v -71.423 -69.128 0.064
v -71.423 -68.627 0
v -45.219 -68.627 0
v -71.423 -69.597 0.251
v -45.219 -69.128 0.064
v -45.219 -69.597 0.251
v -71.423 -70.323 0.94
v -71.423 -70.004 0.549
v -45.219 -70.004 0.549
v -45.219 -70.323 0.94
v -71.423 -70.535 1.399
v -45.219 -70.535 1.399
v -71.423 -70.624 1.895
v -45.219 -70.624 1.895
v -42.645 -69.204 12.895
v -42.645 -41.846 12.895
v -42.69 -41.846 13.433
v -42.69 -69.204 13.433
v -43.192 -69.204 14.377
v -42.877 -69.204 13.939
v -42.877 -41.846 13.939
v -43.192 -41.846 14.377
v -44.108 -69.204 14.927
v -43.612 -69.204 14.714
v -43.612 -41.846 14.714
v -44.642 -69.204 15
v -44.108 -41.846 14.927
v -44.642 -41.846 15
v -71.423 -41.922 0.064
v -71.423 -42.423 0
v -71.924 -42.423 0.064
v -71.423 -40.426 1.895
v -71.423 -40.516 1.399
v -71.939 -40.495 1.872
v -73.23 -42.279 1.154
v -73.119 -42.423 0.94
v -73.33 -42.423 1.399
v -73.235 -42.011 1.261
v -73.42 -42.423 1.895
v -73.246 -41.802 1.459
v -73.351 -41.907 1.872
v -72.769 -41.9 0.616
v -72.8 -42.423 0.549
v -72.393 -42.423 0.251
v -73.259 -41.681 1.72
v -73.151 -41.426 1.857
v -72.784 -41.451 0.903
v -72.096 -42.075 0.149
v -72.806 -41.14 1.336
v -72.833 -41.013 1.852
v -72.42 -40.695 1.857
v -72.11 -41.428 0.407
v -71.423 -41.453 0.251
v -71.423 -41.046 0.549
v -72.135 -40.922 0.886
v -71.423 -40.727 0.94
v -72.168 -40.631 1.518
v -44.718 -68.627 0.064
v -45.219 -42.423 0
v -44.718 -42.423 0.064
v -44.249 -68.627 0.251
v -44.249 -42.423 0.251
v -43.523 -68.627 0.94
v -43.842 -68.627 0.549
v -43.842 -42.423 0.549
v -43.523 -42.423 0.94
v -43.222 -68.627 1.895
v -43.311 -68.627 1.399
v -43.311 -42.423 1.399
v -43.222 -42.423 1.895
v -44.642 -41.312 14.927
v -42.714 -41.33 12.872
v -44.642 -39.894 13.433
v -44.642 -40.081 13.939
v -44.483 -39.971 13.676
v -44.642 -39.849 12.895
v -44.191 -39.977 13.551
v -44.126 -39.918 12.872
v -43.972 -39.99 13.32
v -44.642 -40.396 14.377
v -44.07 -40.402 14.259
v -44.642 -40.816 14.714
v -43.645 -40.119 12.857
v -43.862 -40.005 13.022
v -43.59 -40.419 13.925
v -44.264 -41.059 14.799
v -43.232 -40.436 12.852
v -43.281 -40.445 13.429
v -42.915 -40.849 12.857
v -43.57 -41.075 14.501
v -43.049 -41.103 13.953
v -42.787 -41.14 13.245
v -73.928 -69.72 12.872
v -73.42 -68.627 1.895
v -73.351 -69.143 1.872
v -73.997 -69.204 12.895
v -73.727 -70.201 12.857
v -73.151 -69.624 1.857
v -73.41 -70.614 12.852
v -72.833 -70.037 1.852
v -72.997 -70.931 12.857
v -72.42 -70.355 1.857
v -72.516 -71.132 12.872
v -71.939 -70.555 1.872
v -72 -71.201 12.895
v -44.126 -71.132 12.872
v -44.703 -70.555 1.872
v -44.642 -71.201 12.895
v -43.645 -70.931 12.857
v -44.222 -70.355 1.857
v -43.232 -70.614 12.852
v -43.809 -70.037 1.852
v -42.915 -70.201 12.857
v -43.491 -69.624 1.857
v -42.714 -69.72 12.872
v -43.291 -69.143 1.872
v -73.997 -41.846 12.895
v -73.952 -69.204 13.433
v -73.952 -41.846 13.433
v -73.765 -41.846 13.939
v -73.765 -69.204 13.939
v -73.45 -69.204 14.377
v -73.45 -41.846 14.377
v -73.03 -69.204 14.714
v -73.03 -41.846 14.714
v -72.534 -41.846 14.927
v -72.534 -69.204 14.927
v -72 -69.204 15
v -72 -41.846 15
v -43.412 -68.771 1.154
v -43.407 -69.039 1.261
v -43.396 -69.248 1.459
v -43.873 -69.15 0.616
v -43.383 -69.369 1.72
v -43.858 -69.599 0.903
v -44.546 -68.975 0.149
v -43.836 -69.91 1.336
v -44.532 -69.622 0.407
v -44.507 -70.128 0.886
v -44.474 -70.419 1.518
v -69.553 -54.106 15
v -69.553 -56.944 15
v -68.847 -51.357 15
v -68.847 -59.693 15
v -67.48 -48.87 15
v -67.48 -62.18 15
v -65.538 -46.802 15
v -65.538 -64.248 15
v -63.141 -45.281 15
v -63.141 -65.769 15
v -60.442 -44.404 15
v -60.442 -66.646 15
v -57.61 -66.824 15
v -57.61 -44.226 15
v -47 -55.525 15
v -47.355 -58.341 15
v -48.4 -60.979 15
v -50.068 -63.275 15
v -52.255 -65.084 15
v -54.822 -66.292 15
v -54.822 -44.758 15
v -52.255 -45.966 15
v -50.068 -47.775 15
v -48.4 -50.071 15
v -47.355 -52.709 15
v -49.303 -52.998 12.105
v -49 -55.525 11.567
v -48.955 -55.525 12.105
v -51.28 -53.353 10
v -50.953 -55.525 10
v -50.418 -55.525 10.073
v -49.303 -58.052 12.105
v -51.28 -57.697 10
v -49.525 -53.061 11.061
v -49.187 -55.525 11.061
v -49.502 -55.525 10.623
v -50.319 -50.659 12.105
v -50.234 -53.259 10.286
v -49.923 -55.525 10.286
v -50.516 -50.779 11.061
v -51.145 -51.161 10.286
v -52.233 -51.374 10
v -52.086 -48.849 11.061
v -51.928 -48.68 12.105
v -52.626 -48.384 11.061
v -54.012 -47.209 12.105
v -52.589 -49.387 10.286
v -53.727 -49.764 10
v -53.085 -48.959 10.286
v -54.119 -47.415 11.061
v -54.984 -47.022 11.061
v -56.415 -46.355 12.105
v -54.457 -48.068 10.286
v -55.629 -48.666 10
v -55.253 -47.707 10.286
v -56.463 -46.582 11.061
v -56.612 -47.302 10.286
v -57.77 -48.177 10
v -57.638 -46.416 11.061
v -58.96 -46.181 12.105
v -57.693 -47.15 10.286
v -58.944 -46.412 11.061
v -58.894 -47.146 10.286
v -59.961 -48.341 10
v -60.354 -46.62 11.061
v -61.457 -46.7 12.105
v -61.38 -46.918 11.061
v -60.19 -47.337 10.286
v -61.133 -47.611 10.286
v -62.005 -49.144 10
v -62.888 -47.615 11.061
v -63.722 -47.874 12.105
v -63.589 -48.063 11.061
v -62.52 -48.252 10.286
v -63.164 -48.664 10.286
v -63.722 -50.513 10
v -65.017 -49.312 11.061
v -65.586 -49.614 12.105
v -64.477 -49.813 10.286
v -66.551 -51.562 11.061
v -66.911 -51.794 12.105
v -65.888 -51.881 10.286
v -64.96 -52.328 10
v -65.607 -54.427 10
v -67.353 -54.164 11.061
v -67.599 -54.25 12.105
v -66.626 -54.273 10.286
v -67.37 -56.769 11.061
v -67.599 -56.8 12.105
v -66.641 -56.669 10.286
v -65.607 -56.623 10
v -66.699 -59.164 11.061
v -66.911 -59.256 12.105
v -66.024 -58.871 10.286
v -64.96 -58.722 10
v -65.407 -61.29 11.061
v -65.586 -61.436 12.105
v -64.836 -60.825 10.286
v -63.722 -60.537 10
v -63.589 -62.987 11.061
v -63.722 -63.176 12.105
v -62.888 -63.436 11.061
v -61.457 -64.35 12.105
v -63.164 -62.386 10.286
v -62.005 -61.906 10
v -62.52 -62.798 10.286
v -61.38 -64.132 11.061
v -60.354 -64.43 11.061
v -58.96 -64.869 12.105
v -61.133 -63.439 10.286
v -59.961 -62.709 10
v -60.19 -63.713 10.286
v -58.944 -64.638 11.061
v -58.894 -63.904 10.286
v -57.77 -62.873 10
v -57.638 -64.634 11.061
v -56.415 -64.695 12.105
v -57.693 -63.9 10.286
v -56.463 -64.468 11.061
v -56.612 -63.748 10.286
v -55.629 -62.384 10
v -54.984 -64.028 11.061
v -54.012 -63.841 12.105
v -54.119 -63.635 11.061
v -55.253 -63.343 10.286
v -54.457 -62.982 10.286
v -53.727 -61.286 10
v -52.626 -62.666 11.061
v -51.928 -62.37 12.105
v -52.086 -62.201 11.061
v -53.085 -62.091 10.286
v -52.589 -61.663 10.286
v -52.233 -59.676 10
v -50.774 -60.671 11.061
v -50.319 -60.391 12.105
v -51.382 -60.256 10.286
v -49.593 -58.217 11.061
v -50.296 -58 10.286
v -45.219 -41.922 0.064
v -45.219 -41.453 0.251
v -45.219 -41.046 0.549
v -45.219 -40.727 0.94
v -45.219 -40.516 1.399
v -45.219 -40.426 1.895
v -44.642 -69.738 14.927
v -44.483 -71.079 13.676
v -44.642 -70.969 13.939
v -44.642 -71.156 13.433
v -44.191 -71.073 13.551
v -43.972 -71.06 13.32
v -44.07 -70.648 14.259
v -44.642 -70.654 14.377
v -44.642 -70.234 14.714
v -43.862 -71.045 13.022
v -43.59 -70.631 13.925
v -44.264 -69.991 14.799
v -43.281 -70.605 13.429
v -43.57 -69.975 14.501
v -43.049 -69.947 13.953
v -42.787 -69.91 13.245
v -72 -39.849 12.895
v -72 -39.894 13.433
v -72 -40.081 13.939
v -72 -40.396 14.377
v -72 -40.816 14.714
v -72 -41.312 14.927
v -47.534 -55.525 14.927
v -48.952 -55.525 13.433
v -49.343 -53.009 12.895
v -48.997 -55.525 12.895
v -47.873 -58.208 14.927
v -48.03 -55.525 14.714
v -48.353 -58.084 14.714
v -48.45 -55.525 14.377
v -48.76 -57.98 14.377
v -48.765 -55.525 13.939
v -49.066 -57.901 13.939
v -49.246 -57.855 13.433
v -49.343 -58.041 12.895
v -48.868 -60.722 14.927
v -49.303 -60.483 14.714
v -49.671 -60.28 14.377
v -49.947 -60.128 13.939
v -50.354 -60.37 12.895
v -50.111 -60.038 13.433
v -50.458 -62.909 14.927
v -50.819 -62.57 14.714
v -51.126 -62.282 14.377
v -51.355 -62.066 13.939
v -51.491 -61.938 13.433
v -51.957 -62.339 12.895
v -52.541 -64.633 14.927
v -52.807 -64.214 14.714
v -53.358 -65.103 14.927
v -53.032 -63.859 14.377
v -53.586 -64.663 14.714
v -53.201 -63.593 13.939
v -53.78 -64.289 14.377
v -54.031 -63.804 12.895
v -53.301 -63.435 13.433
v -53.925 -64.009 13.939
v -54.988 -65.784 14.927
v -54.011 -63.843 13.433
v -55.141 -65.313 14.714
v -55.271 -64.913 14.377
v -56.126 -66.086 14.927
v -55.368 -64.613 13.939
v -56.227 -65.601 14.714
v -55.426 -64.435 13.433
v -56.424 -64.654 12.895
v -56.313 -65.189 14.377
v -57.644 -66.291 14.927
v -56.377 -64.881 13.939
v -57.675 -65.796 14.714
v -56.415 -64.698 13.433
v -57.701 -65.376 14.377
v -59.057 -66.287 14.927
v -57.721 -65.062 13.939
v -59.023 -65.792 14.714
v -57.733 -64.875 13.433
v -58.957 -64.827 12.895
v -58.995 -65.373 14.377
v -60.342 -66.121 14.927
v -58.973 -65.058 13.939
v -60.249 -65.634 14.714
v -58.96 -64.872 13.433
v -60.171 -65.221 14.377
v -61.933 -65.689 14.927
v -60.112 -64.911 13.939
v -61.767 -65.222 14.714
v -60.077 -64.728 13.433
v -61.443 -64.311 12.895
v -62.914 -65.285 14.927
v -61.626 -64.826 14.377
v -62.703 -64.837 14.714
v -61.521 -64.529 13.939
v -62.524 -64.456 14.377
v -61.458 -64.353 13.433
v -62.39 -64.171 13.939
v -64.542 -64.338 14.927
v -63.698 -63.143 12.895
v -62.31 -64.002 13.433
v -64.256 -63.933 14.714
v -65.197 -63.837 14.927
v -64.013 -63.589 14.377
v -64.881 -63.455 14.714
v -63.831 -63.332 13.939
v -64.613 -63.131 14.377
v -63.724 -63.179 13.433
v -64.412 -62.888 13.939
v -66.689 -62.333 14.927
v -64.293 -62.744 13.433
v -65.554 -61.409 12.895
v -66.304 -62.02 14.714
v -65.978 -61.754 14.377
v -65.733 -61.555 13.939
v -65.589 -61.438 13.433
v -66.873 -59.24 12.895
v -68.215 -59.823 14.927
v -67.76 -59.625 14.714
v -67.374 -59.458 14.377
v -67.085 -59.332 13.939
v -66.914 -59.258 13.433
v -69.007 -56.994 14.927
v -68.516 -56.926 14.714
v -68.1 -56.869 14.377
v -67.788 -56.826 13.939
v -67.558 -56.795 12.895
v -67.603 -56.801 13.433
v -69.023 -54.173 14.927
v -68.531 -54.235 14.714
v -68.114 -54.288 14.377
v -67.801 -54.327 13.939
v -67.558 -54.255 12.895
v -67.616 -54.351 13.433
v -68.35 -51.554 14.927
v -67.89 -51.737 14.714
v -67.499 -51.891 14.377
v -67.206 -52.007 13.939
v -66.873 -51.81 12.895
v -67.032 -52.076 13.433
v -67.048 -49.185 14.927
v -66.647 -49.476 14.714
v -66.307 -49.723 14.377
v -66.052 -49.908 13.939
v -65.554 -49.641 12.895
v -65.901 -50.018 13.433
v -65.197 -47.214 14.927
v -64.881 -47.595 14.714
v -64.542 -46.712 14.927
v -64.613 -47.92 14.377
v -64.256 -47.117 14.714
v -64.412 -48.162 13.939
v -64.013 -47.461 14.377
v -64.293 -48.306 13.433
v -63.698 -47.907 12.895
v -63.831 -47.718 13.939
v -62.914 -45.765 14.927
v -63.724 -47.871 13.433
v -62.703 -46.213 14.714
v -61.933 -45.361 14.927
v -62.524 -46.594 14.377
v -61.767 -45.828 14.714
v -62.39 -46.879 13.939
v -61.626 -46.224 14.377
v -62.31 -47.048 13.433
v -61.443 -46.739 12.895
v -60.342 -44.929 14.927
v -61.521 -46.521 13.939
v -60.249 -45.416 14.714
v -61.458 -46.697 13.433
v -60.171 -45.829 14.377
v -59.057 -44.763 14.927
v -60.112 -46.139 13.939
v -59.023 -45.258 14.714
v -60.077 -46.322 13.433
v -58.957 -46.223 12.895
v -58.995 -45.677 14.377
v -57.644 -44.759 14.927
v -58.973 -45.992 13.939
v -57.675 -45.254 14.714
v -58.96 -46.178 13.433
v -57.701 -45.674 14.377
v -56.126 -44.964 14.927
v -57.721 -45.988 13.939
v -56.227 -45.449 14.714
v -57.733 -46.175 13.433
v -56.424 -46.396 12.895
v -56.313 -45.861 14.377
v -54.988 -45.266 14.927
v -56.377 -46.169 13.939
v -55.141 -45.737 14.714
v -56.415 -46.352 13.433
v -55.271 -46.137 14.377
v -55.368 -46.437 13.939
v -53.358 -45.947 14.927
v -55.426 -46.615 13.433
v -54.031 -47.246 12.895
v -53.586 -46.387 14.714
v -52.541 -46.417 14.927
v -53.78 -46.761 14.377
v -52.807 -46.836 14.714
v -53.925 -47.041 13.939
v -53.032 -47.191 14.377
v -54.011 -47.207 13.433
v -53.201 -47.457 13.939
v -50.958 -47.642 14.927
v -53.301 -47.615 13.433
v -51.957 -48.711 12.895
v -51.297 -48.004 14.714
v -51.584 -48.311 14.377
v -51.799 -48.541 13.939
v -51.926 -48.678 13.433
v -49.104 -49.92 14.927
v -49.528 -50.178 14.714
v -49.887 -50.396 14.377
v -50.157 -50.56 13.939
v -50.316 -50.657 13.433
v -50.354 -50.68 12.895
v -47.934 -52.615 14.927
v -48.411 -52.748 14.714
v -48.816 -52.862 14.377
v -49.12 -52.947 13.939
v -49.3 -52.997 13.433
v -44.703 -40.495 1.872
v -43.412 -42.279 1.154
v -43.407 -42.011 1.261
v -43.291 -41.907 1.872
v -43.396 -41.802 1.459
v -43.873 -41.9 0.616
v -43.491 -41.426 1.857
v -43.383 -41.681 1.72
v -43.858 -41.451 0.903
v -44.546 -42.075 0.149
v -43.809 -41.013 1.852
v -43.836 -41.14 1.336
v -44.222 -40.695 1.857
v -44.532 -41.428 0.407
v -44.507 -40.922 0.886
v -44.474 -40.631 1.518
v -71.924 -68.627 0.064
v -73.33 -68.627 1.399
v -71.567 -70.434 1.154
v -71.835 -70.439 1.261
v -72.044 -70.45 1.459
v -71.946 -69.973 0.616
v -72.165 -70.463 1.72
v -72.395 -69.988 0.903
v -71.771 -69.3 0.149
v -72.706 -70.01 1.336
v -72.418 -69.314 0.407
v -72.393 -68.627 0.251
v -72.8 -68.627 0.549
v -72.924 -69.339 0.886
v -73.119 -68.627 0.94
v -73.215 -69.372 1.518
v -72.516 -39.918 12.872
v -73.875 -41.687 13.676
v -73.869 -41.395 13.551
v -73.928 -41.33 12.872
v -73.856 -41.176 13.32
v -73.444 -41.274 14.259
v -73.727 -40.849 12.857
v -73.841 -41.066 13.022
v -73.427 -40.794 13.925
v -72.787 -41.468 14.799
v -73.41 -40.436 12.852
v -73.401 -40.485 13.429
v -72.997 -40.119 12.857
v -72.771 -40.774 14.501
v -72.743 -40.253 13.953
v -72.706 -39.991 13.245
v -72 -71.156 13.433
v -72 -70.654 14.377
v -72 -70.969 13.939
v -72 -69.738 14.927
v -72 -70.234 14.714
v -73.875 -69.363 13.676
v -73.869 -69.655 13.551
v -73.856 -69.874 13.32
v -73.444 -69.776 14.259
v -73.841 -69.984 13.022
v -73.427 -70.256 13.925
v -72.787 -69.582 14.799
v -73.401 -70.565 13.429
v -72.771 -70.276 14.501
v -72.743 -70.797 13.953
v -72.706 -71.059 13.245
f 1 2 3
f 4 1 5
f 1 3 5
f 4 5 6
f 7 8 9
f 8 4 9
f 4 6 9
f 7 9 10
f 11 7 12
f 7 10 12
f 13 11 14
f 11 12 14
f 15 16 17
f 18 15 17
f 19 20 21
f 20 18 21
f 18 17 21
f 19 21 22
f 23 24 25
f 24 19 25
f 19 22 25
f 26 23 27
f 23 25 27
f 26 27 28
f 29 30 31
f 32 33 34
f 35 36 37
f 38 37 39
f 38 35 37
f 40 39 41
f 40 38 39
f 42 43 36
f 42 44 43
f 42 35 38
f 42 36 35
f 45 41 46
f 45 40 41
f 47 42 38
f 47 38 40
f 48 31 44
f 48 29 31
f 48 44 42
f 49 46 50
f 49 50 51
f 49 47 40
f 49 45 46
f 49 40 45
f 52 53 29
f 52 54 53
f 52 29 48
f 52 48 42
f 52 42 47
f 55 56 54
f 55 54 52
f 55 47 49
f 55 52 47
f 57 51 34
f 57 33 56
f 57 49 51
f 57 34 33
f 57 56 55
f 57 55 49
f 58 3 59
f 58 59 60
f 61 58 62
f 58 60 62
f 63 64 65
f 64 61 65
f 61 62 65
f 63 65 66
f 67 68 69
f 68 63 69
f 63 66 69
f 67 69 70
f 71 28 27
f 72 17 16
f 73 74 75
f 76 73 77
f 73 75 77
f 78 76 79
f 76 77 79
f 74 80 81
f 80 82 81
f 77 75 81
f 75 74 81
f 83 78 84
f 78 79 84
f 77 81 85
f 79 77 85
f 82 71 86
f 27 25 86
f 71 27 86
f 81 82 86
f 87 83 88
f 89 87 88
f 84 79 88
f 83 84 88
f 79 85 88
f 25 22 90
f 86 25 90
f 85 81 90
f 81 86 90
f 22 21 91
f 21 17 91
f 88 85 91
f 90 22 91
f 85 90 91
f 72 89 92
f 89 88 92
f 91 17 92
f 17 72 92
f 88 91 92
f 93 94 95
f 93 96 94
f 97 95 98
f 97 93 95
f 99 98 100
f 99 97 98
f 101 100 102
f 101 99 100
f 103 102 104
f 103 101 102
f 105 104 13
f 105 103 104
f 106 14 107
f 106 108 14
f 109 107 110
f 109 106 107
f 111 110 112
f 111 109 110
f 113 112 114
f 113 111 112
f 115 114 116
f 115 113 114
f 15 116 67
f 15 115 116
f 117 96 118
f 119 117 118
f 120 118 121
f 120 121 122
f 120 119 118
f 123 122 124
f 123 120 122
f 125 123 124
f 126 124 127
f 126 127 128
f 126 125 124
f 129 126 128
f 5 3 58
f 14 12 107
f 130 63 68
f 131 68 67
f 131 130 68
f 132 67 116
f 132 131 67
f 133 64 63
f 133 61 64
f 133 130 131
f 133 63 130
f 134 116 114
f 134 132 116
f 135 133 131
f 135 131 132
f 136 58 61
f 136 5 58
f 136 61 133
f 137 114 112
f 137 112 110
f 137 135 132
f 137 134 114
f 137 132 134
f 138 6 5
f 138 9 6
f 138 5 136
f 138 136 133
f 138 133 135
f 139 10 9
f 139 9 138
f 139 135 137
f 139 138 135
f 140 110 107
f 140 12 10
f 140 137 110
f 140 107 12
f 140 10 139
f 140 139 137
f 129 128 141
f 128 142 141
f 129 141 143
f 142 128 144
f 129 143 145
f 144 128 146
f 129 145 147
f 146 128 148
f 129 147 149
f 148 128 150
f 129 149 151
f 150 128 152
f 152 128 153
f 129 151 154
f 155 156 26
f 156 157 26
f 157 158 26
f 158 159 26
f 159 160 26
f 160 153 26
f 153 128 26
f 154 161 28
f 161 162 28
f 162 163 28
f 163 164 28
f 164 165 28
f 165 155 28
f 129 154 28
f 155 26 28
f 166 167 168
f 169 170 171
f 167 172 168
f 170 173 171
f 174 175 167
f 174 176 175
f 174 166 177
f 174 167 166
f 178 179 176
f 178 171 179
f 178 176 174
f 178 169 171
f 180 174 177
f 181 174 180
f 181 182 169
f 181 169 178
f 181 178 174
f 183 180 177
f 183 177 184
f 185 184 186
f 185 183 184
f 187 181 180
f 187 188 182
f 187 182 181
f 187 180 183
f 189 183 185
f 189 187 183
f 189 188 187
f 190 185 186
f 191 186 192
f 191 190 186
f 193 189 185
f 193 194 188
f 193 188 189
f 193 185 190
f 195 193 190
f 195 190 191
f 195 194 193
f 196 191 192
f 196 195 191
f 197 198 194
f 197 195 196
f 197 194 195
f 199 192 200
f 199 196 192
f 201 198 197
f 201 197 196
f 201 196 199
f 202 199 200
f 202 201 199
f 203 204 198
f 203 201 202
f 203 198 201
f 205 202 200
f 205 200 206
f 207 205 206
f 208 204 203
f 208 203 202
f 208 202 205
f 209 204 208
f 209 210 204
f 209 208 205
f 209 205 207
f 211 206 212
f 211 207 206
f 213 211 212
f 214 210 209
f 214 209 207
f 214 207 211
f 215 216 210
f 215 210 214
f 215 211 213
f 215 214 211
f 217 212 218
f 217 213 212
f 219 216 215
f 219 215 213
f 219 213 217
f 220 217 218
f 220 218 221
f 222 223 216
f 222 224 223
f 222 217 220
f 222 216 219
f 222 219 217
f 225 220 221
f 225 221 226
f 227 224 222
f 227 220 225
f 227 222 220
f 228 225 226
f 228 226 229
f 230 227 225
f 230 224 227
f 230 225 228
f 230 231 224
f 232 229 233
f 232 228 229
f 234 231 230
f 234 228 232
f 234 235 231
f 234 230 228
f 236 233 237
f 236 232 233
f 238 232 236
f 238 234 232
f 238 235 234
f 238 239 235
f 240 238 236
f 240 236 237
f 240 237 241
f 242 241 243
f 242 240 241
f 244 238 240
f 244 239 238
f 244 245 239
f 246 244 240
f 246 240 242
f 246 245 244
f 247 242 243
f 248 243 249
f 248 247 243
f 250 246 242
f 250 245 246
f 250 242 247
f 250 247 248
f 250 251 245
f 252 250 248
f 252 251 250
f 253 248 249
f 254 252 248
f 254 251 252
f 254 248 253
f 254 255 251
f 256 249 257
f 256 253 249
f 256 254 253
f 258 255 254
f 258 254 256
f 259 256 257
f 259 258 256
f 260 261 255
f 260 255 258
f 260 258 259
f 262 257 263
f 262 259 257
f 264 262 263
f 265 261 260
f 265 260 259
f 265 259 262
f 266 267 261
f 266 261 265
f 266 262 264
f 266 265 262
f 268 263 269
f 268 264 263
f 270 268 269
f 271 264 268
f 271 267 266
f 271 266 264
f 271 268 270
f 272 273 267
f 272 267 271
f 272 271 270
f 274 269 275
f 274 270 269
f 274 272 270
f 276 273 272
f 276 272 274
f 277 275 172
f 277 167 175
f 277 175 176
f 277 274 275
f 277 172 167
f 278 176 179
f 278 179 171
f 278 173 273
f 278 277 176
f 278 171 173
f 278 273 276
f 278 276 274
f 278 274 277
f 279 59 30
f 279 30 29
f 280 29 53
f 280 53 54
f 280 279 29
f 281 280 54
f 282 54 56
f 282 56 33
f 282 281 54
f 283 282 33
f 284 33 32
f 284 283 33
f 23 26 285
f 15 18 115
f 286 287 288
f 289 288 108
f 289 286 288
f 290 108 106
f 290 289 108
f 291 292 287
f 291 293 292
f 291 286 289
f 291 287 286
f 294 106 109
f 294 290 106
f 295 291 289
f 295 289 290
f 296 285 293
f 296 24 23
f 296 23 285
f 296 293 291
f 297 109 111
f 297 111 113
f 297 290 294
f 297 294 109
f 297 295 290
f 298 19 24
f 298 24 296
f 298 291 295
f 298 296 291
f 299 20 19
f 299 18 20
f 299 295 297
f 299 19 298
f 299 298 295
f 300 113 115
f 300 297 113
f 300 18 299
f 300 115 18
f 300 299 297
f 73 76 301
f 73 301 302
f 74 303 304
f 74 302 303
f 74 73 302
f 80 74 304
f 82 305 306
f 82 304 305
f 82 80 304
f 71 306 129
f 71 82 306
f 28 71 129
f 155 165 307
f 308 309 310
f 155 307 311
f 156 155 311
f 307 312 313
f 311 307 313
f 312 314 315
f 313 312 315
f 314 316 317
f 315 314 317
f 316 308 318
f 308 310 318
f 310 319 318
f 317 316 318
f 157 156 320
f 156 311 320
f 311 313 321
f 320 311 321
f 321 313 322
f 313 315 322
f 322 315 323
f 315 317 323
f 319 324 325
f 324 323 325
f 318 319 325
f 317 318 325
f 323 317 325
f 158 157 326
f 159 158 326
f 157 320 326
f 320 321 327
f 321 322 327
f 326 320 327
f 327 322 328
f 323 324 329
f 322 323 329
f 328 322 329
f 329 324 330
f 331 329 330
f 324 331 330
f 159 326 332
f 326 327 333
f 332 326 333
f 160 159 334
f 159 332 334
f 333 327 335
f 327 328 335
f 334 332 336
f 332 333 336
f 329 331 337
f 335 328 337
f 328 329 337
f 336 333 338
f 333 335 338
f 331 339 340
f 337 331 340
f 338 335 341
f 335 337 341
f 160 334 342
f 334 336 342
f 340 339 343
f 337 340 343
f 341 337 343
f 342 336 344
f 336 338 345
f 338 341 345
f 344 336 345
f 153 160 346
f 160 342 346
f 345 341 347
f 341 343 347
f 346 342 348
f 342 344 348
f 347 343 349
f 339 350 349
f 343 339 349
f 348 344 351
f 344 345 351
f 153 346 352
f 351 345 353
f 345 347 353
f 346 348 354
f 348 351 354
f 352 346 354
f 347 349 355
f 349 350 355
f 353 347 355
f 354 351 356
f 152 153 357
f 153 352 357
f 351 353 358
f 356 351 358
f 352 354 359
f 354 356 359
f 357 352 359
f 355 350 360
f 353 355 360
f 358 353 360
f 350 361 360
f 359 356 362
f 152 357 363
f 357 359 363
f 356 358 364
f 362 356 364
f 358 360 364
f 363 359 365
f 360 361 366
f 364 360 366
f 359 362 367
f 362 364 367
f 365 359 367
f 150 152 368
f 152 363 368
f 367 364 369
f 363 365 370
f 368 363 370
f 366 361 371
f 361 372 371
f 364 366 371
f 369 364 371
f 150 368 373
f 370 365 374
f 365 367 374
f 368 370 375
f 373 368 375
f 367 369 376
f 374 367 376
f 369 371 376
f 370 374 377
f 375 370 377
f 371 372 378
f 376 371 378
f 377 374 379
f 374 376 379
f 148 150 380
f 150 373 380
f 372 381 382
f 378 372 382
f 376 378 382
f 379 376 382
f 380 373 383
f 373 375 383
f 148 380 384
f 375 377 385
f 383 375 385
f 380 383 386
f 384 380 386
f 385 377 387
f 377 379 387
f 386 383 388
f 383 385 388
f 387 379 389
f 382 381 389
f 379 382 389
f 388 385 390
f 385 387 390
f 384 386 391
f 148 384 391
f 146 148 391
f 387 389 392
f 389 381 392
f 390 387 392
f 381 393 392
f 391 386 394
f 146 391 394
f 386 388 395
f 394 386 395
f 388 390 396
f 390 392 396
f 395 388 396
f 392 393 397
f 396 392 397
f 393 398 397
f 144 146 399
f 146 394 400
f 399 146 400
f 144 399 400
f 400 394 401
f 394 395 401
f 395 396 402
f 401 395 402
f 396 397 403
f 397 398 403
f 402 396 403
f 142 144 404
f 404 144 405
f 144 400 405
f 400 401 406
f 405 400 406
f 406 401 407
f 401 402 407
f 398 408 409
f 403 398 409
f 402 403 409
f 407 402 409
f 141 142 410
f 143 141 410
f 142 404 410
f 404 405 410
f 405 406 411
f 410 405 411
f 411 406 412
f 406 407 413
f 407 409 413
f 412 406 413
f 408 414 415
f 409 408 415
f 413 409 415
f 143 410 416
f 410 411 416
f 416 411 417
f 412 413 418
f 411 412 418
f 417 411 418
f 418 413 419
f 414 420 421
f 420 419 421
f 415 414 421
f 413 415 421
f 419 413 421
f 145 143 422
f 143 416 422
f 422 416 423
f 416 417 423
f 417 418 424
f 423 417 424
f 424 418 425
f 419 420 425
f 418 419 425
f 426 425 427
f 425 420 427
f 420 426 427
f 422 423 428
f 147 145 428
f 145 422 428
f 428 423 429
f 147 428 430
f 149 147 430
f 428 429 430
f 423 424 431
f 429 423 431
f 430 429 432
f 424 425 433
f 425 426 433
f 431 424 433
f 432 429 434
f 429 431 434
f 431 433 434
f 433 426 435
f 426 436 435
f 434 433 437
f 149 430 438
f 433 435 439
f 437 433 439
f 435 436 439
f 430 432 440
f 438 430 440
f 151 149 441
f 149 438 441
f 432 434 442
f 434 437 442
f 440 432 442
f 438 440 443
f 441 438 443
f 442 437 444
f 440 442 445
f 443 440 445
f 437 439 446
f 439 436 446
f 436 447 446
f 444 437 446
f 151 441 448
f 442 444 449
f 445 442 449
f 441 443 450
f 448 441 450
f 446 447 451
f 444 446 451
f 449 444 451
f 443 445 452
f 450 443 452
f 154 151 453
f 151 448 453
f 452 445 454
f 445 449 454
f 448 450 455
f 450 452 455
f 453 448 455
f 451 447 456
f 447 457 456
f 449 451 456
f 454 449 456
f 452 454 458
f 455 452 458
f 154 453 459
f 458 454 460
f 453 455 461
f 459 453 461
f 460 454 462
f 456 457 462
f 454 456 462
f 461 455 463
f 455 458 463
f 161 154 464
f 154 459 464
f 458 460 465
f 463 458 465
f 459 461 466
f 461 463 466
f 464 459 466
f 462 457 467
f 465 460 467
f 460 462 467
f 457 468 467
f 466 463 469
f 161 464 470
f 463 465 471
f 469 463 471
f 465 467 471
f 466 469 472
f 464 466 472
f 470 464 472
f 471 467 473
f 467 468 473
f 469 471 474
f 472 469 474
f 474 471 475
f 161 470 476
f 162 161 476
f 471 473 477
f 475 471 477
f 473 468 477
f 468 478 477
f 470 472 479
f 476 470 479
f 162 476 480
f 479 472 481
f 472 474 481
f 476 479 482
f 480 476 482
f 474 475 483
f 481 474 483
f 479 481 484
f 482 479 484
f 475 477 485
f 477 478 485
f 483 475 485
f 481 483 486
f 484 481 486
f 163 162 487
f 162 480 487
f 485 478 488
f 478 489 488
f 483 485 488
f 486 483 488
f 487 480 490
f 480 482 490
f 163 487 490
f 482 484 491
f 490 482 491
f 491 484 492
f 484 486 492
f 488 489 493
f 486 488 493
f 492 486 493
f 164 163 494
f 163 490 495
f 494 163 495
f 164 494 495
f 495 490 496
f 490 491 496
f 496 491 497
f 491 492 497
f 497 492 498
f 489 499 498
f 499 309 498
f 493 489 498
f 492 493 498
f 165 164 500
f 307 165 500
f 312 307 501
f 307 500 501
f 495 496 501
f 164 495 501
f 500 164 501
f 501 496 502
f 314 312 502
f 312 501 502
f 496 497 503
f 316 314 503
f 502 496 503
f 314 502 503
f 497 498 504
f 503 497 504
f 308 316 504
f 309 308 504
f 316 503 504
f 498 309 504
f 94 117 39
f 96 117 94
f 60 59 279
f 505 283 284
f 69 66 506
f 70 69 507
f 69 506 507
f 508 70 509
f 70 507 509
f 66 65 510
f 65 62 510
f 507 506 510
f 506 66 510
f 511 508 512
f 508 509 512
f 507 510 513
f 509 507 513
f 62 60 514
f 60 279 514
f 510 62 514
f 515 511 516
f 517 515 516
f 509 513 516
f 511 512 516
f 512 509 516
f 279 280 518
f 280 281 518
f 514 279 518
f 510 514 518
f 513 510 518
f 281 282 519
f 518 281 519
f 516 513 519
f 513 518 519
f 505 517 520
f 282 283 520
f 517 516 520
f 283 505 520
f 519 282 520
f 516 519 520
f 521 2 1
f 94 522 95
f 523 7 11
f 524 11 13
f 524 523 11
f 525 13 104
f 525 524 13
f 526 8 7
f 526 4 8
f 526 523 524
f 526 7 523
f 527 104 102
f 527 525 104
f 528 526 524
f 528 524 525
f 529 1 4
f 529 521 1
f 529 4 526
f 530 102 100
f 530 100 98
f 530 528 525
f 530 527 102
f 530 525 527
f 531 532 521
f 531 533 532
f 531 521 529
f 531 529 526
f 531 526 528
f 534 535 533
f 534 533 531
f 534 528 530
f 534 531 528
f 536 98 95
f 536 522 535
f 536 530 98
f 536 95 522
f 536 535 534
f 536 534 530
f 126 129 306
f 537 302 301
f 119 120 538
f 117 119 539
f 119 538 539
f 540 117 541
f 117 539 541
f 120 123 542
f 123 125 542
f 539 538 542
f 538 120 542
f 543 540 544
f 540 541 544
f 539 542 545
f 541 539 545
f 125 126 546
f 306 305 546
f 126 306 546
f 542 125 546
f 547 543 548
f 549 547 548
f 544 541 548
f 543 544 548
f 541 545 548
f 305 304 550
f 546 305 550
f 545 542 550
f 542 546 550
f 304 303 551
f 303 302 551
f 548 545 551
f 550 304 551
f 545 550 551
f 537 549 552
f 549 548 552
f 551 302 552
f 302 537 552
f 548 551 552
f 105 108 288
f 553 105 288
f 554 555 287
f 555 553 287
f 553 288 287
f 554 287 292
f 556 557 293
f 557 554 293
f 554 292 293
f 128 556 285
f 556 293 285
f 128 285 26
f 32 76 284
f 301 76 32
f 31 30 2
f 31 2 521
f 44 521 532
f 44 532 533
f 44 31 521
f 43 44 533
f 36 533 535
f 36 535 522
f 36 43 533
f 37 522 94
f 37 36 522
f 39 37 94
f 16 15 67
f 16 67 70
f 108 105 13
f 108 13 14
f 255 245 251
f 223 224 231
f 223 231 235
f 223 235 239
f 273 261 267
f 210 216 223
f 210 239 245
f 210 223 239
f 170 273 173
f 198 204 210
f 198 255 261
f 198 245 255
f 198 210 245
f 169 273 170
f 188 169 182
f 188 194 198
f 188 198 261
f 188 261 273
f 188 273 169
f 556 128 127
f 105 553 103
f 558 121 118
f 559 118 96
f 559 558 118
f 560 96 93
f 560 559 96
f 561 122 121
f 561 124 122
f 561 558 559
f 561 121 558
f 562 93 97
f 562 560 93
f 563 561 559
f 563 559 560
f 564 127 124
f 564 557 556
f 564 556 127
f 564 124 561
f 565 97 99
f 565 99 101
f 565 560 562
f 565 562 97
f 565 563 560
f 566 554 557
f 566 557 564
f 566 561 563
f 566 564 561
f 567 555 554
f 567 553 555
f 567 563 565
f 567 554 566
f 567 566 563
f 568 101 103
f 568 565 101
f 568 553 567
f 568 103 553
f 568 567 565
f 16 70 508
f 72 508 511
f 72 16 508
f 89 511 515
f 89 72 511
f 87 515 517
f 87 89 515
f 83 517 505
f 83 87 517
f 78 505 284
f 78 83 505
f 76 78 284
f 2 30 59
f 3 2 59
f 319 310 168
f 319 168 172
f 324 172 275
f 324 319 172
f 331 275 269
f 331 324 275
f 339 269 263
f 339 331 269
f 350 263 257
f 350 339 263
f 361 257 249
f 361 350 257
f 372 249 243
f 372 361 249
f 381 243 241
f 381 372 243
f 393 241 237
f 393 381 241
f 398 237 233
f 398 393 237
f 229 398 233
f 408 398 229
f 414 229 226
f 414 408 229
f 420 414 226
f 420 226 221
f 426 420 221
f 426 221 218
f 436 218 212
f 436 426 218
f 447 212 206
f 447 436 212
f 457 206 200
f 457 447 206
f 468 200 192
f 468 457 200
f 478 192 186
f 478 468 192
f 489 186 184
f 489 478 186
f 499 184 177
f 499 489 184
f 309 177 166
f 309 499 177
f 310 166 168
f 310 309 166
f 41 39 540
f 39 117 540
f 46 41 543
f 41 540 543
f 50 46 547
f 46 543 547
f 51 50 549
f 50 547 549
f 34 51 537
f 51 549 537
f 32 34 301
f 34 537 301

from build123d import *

# Parameters (mm, degrees)
F0_W     = 30
F0_H     = 30
F0_R     = 10
F1_DEPTH = 15
F1_TAPER = -3
F2_DEPTH = 10
F3_R     = 2


with BuildPart() as f1:
    # F0 (on Top) → F1 (new body)
    with BuildSketch(Plane.XY):
        with Locations((-58.3209823817, -55.5250146758)):
            Rectangle(F0_W, F0_H)
        with Locations((-58.3209823817, -55.5250146758)):
            Circle(F0_R, mode=Mode.SUBTRACT)
    extrude(amount=F1_DEPTH, taper=F1_TAPER)

    # F0 (on Top) → F2 (join)
    with BuildSketch(Plane.XY):
        with Locations((-58.3209823817, -55.5250146758)):
            Circle(F0_R)
    extrude(amount=F2_DEPTH)

    # F3
    f3_edges = [f1.edges().sort_by_distance(p)[0] for p in [
        (-67.796905, -55.525015, 10),
        (-67.534866, -55.525015, 15),
        (-42.534866, -55.525015, 15),
        (-58.320982, -39.738898, 15),
        (-58.320982, -71.311131, 15),
        (-74.107099, -55.525015, 15),
        (-58.320982, -40.525015, 0),
        (-73.320982, -55.525015, 0),
        (-58.320982, -70.525015, 0),
        (-43.320982, -55.525015, 0),
        (-42.927924, -70.918073, 7.5),
        (-42.927924, -40.131956, 7.5),
        (-73.714041, -70.918073, 7.5),
        (-73.714041, -40.131956, 7.5),
    ]]
    fillet(f3_edges, radius=F3_R)


solid = f1.part
